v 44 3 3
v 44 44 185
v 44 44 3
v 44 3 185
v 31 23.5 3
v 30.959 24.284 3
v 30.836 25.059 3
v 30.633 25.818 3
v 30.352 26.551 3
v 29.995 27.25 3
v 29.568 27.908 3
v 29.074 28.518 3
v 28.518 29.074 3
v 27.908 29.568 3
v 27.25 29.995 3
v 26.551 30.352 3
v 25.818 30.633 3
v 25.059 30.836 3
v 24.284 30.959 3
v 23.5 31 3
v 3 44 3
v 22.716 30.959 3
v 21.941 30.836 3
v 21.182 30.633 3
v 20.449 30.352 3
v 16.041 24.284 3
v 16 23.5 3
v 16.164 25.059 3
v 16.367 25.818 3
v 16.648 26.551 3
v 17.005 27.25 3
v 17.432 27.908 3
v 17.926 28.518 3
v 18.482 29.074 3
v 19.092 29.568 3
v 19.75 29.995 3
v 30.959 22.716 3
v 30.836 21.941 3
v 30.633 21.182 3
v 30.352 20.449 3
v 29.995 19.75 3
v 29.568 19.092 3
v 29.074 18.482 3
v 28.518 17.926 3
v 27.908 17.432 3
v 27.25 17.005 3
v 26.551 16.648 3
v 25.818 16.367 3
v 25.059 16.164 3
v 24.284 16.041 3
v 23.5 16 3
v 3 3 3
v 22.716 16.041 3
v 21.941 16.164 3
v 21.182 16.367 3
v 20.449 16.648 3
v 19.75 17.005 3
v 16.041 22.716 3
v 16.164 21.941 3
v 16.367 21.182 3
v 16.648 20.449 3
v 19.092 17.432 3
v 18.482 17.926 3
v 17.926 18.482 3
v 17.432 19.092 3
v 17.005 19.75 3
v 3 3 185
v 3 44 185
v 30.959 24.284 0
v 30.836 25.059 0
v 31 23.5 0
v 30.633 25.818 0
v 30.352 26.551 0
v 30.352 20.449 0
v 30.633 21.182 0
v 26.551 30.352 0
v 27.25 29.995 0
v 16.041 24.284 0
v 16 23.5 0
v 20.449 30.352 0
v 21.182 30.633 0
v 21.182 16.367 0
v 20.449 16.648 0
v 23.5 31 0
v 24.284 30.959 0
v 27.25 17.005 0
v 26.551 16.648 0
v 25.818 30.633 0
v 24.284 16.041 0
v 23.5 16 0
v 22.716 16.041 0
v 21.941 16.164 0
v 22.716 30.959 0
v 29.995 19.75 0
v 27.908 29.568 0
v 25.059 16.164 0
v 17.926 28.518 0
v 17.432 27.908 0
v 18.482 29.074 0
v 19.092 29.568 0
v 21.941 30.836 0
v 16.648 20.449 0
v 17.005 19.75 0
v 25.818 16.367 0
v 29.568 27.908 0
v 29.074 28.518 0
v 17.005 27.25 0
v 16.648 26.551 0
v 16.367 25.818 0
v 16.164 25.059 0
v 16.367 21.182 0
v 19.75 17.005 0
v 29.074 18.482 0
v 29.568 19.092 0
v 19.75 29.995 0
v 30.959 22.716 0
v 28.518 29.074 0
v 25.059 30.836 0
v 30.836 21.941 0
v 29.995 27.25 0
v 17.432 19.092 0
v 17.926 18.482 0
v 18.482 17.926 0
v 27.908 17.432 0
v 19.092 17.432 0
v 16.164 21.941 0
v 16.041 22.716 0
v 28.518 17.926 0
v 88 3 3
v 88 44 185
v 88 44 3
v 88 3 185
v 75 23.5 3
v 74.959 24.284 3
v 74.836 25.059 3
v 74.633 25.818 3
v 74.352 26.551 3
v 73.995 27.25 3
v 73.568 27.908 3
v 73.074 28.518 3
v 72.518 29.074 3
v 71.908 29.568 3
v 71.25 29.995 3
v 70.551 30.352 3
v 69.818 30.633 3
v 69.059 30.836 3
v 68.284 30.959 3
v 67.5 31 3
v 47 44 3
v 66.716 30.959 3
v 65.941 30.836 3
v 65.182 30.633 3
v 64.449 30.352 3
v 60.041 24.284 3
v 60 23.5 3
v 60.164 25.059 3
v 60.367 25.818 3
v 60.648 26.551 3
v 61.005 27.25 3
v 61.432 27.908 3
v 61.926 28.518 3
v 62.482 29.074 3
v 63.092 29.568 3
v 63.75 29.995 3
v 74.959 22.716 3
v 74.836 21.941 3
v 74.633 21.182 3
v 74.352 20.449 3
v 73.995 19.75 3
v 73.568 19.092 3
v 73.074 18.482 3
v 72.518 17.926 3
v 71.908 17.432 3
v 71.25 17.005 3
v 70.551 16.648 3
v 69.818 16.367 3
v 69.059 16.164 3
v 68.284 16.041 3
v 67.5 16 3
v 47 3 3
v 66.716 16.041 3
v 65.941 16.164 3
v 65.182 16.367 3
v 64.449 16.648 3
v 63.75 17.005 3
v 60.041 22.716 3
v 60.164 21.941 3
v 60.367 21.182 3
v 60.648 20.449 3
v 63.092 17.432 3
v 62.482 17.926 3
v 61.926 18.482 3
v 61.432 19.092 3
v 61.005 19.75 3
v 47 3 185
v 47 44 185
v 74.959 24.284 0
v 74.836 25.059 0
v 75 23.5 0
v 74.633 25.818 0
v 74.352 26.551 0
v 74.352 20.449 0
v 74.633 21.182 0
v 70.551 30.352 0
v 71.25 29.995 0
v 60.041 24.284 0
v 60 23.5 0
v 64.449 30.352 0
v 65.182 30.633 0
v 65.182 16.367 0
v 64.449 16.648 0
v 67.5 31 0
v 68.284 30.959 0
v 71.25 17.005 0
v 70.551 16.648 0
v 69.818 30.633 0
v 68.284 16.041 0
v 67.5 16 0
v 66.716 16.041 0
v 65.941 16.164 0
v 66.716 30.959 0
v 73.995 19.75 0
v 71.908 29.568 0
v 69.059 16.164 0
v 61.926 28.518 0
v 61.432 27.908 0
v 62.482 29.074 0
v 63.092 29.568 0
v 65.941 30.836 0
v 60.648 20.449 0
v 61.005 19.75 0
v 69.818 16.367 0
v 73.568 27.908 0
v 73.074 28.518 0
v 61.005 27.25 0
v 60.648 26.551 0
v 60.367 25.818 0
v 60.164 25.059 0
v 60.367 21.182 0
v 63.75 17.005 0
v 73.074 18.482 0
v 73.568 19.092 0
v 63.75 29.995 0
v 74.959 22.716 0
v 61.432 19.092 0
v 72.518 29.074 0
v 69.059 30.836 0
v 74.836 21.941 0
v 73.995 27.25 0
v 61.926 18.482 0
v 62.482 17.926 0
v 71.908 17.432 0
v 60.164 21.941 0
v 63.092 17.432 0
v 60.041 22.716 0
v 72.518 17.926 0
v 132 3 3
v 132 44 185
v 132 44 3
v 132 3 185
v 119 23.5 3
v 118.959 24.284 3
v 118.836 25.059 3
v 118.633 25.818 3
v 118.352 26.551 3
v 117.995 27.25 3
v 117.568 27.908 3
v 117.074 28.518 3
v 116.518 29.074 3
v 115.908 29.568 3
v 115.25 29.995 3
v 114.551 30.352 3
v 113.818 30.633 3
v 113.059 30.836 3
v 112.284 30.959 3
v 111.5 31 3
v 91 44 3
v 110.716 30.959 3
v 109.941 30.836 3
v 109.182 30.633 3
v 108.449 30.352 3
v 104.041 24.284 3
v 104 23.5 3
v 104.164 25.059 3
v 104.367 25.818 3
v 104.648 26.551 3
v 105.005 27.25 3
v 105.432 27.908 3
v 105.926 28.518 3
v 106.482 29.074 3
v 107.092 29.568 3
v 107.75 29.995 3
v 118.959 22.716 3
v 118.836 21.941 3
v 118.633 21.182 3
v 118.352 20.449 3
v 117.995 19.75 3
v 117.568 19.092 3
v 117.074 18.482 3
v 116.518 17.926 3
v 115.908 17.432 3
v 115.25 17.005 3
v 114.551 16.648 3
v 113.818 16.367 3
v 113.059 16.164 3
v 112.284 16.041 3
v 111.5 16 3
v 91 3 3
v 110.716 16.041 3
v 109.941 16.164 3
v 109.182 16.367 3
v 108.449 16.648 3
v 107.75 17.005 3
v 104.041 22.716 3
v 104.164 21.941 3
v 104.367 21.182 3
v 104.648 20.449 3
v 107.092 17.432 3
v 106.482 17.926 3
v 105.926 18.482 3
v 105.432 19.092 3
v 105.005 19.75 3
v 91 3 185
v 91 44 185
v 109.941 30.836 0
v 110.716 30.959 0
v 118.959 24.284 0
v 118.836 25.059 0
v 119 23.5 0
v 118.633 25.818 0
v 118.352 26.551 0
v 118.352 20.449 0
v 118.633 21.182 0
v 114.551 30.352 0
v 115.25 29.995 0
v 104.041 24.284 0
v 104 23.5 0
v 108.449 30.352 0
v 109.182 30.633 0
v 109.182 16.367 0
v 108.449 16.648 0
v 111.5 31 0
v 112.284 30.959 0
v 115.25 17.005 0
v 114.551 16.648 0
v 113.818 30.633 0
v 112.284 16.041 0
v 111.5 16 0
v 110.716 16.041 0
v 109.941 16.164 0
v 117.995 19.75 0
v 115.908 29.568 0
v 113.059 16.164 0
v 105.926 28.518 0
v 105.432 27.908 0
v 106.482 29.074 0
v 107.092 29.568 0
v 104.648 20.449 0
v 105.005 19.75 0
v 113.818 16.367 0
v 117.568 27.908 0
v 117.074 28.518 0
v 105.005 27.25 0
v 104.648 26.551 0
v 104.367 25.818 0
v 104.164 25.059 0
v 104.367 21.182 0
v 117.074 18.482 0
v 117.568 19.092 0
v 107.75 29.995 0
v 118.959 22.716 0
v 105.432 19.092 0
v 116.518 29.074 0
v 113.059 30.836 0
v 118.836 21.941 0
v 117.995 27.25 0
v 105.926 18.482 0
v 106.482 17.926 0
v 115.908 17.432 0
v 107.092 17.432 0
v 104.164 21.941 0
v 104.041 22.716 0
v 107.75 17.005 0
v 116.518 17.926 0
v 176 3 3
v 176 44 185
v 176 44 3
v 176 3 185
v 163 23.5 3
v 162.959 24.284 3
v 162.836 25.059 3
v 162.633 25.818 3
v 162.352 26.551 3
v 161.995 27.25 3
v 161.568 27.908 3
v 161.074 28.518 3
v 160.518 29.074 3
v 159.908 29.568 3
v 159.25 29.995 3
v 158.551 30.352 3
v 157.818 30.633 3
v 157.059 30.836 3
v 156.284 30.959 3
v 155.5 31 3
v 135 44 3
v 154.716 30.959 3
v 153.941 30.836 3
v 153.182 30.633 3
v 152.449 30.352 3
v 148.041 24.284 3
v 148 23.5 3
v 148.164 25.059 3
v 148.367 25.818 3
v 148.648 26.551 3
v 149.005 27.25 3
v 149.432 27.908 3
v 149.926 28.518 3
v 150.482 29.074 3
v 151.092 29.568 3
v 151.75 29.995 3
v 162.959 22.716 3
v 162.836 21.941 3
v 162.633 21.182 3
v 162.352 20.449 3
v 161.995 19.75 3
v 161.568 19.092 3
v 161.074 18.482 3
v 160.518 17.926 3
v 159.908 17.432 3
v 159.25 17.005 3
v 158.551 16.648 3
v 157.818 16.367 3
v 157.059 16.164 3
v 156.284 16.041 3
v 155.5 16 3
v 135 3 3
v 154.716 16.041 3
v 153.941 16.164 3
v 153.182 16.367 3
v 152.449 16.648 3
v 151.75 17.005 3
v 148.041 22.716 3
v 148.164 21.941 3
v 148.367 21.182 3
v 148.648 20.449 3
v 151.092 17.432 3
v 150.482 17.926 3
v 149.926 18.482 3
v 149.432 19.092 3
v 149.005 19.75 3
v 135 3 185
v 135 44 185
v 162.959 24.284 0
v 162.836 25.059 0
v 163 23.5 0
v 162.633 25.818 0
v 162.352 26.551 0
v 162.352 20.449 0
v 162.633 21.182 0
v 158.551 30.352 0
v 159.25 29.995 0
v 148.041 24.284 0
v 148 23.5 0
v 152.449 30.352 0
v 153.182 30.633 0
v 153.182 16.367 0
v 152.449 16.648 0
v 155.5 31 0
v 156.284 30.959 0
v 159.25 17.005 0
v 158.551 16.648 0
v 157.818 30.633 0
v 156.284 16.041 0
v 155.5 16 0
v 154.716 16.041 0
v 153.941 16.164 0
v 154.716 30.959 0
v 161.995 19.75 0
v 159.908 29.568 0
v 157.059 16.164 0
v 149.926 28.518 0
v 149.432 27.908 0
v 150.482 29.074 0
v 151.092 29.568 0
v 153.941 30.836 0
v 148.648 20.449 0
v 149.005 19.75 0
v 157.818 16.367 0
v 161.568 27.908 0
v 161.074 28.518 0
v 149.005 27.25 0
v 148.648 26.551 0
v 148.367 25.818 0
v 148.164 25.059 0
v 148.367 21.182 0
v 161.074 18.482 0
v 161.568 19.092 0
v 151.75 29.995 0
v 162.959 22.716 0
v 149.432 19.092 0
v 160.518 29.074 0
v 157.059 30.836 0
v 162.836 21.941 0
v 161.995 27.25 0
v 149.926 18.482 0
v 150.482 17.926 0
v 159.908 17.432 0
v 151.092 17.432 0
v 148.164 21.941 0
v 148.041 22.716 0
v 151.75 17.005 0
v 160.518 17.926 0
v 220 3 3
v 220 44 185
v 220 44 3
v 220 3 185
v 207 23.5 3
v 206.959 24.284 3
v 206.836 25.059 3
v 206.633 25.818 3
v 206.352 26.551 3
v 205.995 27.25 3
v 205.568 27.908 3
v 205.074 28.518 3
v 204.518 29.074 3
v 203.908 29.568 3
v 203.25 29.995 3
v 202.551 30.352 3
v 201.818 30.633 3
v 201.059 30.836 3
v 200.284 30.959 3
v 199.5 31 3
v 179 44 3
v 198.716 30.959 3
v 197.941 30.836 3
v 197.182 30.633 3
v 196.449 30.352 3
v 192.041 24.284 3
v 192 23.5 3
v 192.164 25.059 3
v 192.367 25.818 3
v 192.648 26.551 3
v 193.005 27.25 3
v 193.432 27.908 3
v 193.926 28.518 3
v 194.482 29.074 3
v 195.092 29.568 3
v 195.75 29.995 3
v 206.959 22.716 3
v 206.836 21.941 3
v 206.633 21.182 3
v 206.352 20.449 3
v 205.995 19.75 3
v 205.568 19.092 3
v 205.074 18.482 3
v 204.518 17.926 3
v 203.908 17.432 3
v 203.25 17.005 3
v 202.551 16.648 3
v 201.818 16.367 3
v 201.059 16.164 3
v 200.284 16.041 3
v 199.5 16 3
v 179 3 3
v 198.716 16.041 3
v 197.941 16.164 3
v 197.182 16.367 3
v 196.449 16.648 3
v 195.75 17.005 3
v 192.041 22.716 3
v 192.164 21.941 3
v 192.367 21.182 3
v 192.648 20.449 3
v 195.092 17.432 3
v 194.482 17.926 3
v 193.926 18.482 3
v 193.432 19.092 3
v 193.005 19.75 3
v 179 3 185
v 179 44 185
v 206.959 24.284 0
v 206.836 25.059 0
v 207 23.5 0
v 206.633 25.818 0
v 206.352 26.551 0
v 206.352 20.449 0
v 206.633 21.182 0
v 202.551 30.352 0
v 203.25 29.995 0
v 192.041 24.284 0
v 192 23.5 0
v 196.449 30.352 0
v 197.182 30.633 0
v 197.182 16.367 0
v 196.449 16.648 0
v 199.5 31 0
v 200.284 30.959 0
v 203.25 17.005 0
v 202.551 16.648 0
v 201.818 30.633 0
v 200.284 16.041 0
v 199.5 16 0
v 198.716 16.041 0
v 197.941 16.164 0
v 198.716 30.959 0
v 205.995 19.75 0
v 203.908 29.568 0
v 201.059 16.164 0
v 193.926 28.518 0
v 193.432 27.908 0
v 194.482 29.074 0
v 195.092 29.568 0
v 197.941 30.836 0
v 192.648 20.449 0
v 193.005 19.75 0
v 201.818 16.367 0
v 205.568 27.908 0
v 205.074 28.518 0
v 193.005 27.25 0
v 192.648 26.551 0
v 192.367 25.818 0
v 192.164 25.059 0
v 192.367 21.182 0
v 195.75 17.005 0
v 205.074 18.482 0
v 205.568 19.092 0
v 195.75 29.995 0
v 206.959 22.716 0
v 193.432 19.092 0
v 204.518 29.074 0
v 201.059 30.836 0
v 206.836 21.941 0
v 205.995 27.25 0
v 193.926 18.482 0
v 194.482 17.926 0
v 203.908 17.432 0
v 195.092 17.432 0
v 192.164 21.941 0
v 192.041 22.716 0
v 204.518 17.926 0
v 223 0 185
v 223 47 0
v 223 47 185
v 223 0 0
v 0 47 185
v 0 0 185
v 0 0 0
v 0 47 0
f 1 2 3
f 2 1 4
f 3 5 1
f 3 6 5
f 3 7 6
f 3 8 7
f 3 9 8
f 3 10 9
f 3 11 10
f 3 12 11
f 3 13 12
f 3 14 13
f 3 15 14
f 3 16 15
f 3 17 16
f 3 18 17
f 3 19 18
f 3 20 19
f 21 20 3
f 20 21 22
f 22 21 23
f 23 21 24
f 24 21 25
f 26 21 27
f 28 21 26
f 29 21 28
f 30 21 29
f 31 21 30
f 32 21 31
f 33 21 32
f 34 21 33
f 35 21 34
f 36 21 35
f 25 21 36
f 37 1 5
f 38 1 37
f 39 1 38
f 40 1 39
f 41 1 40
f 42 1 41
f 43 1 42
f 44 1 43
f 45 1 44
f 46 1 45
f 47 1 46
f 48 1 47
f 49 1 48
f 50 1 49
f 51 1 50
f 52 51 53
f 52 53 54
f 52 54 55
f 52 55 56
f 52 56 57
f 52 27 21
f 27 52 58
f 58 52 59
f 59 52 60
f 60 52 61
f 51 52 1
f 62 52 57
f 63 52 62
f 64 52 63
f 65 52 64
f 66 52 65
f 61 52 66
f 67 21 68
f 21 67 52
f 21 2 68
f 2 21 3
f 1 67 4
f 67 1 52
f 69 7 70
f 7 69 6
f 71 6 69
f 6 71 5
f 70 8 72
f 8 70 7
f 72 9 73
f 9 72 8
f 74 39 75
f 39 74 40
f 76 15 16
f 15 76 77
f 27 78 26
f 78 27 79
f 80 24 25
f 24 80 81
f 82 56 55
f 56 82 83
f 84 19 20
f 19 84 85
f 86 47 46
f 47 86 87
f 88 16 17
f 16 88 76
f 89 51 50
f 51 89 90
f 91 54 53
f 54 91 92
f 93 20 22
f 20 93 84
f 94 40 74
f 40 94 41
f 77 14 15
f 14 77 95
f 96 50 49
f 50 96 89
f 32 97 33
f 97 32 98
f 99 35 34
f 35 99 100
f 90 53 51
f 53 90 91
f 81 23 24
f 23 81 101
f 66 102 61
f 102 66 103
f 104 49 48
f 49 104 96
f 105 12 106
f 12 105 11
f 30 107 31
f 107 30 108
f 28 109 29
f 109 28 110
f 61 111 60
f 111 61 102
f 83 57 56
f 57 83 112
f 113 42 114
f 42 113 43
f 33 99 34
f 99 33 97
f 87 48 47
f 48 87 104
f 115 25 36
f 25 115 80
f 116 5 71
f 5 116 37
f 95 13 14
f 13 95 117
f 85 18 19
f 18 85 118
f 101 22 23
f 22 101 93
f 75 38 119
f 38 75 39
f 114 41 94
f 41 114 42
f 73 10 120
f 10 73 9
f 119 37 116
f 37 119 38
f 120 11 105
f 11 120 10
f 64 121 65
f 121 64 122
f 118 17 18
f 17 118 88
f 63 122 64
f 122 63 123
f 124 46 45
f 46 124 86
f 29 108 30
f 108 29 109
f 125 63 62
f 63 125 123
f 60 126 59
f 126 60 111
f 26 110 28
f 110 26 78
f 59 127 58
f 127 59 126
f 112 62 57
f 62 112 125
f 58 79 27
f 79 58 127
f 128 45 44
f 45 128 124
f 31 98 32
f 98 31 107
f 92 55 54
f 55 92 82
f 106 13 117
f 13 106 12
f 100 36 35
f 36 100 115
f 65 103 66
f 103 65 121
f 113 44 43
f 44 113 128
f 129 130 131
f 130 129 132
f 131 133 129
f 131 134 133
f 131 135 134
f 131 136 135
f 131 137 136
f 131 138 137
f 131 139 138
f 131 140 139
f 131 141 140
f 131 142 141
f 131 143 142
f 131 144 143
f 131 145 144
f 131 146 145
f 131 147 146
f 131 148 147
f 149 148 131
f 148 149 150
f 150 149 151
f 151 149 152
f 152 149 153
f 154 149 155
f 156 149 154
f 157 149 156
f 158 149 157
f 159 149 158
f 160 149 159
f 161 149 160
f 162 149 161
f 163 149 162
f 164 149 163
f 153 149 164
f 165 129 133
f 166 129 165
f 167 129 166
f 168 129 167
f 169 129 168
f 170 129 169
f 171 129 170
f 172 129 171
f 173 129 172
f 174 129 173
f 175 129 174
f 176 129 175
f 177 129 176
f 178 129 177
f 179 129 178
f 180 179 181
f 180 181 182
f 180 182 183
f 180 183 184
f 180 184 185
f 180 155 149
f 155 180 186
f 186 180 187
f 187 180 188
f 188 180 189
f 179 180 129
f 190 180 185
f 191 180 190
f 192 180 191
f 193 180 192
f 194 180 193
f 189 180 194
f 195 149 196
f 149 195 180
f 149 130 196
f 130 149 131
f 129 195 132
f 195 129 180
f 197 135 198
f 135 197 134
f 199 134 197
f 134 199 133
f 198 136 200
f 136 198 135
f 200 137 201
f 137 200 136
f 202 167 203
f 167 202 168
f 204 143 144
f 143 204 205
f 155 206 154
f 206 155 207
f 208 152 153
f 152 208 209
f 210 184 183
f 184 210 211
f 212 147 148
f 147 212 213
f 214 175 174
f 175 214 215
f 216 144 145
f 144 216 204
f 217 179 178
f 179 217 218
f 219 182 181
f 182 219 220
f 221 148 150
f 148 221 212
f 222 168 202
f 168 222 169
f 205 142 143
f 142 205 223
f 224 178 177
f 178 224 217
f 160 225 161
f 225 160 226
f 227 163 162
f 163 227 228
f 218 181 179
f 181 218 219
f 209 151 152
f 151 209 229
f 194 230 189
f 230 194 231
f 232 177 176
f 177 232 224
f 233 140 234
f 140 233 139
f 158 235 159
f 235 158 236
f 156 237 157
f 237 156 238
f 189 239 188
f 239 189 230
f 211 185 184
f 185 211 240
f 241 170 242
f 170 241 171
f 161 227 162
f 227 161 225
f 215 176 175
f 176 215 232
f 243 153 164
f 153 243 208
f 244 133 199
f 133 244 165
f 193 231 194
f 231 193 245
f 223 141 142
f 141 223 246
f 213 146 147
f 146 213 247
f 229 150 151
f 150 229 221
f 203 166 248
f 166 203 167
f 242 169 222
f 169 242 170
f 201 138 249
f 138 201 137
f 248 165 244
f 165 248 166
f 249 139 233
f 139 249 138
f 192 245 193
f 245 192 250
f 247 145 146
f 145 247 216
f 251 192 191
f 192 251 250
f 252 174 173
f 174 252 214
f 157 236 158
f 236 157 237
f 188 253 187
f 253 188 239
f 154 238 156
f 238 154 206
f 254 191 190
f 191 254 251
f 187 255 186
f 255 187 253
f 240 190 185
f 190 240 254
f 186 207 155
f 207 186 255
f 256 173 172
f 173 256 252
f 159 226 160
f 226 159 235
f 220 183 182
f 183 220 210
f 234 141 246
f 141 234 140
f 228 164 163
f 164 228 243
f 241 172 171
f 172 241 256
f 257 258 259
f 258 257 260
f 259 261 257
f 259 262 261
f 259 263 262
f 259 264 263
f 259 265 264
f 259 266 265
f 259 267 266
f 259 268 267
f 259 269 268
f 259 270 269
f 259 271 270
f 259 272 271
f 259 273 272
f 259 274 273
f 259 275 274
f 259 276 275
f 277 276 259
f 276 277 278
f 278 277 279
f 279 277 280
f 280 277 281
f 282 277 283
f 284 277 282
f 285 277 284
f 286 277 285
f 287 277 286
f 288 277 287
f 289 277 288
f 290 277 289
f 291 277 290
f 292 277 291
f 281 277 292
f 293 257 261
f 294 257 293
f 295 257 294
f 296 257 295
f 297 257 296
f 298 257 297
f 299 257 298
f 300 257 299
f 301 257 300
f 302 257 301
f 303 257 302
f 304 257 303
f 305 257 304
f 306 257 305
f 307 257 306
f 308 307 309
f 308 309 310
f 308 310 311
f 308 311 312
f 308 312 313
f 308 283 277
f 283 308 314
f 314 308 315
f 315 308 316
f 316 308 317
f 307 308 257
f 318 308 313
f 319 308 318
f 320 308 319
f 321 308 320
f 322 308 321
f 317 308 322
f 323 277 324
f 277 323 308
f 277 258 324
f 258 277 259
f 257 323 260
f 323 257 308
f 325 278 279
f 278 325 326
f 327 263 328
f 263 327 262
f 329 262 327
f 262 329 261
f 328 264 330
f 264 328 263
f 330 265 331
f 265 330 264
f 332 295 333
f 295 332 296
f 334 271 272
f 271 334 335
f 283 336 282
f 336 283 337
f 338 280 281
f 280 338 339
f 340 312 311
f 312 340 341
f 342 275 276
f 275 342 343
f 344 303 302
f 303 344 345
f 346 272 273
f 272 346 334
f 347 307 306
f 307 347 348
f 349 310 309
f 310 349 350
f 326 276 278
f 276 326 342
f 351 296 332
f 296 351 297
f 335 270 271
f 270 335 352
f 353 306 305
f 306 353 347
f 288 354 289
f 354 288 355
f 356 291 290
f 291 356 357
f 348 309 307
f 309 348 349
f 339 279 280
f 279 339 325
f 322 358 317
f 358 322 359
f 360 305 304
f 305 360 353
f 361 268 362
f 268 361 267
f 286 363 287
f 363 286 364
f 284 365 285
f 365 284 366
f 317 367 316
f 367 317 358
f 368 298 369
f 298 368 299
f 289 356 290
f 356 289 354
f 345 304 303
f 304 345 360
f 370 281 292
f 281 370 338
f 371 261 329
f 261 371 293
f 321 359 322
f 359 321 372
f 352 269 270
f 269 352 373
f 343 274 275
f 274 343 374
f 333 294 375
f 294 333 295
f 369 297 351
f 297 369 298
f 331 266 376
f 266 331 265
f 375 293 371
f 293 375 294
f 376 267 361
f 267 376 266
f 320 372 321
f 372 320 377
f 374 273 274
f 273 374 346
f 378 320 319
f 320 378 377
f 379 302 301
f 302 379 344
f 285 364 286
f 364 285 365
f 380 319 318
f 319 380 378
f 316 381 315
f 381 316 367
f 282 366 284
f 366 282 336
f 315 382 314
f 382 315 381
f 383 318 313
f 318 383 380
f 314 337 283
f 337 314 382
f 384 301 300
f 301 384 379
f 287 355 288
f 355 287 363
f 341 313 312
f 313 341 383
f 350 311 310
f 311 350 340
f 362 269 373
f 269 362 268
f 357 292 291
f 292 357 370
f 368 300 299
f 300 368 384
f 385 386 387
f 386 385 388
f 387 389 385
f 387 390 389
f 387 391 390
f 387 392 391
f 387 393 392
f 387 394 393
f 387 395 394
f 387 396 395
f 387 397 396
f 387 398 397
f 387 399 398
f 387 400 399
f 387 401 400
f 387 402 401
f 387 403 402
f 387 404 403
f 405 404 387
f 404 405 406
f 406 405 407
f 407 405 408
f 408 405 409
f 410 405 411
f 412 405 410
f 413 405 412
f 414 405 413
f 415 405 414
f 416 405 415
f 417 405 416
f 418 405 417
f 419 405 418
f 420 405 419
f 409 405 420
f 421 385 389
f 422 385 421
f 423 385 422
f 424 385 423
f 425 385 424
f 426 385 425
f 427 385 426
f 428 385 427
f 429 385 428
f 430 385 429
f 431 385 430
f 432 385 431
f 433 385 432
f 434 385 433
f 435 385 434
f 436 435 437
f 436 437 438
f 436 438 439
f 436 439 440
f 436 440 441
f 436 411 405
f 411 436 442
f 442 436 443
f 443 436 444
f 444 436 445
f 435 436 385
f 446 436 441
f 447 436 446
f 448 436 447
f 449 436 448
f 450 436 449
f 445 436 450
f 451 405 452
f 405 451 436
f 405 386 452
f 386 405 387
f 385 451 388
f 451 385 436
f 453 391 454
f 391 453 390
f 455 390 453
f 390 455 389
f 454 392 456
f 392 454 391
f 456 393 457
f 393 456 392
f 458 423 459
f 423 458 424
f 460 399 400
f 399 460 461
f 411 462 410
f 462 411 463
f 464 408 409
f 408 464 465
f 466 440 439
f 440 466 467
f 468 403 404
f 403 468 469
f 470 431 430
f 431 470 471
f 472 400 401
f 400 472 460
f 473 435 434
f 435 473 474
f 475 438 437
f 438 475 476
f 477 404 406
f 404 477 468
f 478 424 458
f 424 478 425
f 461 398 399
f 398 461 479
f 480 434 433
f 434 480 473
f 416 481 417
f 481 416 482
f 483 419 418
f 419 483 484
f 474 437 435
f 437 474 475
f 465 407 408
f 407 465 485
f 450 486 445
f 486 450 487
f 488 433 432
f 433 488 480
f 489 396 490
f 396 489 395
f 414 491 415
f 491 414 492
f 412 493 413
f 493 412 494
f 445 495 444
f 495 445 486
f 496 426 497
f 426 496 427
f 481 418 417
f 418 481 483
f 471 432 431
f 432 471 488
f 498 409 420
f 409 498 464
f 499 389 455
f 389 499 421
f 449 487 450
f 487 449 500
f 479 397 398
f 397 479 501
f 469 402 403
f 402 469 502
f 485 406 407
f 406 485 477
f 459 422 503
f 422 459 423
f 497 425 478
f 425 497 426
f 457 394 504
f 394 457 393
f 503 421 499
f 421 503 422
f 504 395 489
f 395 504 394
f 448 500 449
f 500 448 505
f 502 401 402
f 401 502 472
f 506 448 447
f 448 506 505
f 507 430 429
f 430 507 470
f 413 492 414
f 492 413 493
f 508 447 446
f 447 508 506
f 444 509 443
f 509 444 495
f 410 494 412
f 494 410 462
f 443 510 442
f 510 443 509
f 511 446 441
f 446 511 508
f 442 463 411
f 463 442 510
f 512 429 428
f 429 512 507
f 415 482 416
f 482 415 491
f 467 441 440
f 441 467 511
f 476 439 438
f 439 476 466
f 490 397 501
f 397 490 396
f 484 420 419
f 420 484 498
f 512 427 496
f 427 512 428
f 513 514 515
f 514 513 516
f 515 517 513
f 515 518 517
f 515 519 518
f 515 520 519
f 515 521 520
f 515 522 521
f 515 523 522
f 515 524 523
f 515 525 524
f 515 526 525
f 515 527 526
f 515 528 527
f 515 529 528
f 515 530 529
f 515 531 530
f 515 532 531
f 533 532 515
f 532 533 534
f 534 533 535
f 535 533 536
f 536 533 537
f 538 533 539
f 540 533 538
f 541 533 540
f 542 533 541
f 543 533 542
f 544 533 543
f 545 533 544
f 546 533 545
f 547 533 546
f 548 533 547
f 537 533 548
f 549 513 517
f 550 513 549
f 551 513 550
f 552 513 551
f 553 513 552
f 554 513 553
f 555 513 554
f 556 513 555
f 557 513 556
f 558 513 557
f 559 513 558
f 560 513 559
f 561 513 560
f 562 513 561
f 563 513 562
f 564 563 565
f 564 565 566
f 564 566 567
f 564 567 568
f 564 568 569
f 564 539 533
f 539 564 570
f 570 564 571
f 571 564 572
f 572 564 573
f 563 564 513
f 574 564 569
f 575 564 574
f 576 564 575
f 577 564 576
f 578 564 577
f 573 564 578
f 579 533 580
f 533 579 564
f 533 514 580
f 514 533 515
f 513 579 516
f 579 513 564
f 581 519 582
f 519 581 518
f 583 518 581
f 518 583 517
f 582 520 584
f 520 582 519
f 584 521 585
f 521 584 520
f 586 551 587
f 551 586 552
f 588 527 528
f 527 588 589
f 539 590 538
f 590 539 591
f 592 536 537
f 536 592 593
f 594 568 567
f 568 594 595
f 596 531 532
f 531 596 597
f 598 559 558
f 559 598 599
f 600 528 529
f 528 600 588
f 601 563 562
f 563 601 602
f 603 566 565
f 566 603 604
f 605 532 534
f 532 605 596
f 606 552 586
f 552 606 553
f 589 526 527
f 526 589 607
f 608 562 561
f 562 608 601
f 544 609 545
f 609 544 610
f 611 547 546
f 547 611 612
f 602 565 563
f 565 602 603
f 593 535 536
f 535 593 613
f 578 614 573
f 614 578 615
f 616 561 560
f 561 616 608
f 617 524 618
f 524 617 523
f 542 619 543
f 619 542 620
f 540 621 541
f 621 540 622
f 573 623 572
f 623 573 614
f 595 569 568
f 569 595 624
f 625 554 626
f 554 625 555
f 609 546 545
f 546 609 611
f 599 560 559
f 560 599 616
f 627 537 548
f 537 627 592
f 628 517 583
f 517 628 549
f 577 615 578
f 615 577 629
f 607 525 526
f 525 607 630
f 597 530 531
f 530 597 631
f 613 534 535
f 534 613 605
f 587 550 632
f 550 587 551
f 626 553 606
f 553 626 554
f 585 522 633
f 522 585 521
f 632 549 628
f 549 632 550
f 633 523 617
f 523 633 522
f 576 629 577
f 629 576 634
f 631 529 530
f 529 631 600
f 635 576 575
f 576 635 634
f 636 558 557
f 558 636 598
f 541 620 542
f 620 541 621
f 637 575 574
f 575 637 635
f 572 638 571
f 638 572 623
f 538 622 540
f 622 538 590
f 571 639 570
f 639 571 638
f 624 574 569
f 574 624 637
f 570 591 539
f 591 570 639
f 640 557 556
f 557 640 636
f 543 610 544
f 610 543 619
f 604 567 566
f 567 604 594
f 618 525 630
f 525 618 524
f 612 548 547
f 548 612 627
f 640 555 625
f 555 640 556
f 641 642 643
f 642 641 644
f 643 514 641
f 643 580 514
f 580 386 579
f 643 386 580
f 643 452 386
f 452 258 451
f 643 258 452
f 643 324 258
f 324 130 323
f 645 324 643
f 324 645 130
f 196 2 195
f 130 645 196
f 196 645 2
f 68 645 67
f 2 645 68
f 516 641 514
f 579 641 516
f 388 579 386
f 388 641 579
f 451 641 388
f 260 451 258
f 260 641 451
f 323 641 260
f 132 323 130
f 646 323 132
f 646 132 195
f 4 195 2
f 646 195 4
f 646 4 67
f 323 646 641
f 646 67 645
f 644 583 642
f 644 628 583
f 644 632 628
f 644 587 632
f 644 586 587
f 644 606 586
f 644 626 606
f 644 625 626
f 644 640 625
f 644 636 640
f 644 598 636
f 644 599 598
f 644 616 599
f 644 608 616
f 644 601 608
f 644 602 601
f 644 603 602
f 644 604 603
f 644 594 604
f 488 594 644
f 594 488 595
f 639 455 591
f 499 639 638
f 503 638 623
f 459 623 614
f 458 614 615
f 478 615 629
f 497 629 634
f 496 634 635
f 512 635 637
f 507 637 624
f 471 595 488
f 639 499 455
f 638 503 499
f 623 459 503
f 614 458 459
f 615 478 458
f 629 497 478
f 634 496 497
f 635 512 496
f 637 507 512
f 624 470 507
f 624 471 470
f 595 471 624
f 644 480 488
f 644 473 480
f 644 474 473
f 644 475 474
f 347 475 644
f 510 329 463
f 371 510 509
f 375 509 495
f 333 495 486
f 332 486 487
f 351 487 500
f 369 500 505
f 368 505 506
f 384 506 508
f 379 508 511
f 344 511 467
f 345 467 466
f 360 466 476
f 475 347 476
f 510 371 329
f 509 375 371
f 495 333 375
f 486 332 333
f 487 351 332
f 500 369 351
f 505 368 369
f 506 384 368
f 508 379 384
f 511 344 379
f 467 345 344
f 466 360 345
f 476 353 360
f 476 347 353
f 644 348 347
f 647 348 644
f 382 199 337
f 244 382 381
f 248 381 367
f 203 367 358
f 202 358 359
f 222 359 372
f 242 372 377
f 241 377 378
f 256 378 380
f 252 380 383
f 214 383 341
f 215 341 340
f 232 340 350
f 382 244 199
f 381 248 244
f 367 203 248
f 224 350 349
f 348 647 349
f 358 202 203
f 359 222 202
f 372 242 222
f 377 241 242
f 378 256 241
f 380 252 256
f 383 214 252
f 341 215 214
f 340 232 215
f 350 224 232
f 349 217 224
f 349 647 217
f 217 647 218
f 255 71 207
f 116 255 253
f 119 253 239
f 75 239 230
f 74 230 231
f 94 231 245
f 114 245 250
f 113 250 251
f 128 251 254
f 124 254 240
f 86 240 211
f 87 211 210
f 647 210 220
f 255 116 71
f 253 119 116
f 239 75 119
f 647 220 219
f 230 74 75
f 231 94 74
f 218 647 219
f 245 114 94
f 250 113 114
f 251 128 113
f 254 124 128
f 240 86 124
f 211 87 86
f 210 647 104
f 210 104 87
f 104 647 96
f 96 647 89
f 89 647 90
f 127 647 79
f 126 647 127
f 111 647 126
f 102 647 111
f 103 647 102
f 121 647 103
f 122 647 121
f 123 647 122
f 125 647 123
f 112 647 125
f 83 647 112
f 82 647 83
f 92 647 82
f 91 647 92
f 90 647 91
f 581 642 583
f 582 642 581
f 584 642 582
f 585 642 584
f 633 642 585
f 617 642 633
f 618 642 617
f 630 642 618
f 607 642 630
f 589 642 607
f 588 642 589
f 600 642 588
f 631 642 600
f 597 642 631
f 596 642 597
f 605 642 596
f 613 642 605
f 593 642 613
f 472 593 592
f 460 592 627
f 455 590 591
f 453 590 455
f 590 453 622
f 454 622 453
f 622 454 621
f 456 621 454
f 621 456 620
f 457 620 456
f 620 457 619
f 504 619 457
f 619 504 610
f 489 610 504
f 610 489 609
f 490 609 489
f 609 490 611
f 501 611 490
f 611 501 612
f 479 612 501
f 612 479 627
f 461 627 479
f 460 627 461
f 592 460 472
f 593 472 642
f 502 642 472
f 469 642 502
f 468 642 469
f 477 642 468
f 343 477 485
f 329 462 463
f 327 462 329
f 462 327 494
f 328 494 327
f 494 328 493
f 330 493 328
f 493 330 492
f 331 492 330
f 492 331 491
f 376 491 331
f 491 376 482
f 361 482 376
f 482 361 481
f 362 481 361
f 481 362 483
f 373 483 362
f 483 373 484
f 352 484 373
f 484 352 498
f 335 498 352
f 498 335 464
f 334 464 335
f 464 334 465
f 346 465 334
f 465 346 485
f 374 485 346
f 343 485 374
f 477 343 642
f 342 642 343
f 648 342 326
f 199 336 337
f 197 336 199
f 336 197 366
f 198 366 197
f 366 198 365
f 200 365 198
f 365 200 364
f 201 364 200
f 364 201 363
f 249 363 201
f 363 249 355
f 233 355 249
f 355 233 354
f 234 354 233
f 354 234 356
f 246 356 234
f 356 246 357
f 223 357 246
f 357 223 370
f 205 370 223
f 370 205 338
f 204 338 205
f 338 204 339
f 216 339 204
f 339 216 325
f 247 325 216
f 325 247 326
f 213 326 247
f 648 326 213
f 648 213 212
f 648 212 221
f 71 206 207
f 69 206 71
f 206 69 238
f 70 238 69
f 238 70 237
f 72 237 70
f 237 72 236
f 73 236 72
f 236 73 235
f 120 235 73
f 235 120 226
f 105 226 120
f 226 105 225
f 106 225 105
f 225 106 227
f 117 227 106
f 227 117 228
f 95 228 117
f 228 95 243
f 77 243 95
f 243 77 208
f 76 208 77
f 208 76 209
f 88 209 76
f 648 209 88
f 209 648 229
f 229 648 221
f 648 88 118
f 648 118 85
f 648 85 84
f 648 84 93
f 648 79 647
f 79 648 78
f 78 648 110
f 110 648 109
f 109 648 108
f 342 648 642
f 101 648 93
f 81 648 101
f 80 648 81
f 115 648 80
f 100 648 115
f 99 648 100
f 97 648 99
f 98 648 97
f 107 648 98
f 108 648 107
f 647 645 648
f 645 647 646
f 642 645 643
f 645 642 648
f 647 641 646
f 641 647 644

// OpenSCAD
// --- 3Dプリント用 VTM-T20のケース ---

// [表示設定] 
show_cross_section = false;   // ★実際に3Dプリントする際は false にしてください★

// [声道模型の収納空間の設定] 
// 余裕を見て1mmずつ広めに設定しています
slot_width = 41.0;   // 4x4cm -> 4.1cm
slot_depth = 41.0;   
slot_length = 182.0; // 18cm -> 18.2cm

// [ケース全体の設定]
slot_count = 5;      // 5つの声道模型を入れる
wall_thickness = 3.0; // 外壁と仕切り板の肉厚

// [自動計算パラメータ]
total_inner_width = (slot_width * slot_count) + (wall_thickness * (slot_count - 1));
total_outer_width = total_inner_width + (wall_thickness * 2);
total_outer_depth = slot_depth + (wall_thickness * 2);

total_outer_length = slot_length + wall_thickness; 

$fn = 60; // 曲面の滑らかさ

// --- モジュール定義 ---

module vocal_tract_case() {
    difference() {
        // --- 外側の形状（実体） ---
        cube([total_outer_width, total_outer_depth, total_outer_length], center = false);

        // --- 内側のくり抜き ---
        for (i = [0 : slot_count - 1]) {
            // X軸方向の移動距離を計算
            x_offset = wall_thickness + (i * (slot_width + wall_thickness));
            
            // 1. 収納空間（上へ突き抜けて完全に開放する）
            translate([x_offset, wall_thickness, wall_thickness]) 
                cube([slot_width, slot_depth, slot_length + 1.0], center = false);
            
            // 2. 通気穴（底面に大きな穴を開ける）
            // 縦置きプリントなら、底面に穴があってもサポート材は一切不要で綺麗に抜けます
            translate([x_offset + (slot_width / 2), wall_thickness + (slot_depth / 2), -1])
                cylinder(h = wall_thickness + 2.0, d = 15.0, center = false);
        }
    }
}

// --- 描画処理 ---
if (show_cross_section) {
    difference() {
        vocal_tract_case();
        // 断面を見せるために手前半分をカット
        translate([total_outer_width / 2, -50, -10]) cube([total_outer_width, 100, 300]);
    }
} else {
    vocal_tract_case(); 
}
